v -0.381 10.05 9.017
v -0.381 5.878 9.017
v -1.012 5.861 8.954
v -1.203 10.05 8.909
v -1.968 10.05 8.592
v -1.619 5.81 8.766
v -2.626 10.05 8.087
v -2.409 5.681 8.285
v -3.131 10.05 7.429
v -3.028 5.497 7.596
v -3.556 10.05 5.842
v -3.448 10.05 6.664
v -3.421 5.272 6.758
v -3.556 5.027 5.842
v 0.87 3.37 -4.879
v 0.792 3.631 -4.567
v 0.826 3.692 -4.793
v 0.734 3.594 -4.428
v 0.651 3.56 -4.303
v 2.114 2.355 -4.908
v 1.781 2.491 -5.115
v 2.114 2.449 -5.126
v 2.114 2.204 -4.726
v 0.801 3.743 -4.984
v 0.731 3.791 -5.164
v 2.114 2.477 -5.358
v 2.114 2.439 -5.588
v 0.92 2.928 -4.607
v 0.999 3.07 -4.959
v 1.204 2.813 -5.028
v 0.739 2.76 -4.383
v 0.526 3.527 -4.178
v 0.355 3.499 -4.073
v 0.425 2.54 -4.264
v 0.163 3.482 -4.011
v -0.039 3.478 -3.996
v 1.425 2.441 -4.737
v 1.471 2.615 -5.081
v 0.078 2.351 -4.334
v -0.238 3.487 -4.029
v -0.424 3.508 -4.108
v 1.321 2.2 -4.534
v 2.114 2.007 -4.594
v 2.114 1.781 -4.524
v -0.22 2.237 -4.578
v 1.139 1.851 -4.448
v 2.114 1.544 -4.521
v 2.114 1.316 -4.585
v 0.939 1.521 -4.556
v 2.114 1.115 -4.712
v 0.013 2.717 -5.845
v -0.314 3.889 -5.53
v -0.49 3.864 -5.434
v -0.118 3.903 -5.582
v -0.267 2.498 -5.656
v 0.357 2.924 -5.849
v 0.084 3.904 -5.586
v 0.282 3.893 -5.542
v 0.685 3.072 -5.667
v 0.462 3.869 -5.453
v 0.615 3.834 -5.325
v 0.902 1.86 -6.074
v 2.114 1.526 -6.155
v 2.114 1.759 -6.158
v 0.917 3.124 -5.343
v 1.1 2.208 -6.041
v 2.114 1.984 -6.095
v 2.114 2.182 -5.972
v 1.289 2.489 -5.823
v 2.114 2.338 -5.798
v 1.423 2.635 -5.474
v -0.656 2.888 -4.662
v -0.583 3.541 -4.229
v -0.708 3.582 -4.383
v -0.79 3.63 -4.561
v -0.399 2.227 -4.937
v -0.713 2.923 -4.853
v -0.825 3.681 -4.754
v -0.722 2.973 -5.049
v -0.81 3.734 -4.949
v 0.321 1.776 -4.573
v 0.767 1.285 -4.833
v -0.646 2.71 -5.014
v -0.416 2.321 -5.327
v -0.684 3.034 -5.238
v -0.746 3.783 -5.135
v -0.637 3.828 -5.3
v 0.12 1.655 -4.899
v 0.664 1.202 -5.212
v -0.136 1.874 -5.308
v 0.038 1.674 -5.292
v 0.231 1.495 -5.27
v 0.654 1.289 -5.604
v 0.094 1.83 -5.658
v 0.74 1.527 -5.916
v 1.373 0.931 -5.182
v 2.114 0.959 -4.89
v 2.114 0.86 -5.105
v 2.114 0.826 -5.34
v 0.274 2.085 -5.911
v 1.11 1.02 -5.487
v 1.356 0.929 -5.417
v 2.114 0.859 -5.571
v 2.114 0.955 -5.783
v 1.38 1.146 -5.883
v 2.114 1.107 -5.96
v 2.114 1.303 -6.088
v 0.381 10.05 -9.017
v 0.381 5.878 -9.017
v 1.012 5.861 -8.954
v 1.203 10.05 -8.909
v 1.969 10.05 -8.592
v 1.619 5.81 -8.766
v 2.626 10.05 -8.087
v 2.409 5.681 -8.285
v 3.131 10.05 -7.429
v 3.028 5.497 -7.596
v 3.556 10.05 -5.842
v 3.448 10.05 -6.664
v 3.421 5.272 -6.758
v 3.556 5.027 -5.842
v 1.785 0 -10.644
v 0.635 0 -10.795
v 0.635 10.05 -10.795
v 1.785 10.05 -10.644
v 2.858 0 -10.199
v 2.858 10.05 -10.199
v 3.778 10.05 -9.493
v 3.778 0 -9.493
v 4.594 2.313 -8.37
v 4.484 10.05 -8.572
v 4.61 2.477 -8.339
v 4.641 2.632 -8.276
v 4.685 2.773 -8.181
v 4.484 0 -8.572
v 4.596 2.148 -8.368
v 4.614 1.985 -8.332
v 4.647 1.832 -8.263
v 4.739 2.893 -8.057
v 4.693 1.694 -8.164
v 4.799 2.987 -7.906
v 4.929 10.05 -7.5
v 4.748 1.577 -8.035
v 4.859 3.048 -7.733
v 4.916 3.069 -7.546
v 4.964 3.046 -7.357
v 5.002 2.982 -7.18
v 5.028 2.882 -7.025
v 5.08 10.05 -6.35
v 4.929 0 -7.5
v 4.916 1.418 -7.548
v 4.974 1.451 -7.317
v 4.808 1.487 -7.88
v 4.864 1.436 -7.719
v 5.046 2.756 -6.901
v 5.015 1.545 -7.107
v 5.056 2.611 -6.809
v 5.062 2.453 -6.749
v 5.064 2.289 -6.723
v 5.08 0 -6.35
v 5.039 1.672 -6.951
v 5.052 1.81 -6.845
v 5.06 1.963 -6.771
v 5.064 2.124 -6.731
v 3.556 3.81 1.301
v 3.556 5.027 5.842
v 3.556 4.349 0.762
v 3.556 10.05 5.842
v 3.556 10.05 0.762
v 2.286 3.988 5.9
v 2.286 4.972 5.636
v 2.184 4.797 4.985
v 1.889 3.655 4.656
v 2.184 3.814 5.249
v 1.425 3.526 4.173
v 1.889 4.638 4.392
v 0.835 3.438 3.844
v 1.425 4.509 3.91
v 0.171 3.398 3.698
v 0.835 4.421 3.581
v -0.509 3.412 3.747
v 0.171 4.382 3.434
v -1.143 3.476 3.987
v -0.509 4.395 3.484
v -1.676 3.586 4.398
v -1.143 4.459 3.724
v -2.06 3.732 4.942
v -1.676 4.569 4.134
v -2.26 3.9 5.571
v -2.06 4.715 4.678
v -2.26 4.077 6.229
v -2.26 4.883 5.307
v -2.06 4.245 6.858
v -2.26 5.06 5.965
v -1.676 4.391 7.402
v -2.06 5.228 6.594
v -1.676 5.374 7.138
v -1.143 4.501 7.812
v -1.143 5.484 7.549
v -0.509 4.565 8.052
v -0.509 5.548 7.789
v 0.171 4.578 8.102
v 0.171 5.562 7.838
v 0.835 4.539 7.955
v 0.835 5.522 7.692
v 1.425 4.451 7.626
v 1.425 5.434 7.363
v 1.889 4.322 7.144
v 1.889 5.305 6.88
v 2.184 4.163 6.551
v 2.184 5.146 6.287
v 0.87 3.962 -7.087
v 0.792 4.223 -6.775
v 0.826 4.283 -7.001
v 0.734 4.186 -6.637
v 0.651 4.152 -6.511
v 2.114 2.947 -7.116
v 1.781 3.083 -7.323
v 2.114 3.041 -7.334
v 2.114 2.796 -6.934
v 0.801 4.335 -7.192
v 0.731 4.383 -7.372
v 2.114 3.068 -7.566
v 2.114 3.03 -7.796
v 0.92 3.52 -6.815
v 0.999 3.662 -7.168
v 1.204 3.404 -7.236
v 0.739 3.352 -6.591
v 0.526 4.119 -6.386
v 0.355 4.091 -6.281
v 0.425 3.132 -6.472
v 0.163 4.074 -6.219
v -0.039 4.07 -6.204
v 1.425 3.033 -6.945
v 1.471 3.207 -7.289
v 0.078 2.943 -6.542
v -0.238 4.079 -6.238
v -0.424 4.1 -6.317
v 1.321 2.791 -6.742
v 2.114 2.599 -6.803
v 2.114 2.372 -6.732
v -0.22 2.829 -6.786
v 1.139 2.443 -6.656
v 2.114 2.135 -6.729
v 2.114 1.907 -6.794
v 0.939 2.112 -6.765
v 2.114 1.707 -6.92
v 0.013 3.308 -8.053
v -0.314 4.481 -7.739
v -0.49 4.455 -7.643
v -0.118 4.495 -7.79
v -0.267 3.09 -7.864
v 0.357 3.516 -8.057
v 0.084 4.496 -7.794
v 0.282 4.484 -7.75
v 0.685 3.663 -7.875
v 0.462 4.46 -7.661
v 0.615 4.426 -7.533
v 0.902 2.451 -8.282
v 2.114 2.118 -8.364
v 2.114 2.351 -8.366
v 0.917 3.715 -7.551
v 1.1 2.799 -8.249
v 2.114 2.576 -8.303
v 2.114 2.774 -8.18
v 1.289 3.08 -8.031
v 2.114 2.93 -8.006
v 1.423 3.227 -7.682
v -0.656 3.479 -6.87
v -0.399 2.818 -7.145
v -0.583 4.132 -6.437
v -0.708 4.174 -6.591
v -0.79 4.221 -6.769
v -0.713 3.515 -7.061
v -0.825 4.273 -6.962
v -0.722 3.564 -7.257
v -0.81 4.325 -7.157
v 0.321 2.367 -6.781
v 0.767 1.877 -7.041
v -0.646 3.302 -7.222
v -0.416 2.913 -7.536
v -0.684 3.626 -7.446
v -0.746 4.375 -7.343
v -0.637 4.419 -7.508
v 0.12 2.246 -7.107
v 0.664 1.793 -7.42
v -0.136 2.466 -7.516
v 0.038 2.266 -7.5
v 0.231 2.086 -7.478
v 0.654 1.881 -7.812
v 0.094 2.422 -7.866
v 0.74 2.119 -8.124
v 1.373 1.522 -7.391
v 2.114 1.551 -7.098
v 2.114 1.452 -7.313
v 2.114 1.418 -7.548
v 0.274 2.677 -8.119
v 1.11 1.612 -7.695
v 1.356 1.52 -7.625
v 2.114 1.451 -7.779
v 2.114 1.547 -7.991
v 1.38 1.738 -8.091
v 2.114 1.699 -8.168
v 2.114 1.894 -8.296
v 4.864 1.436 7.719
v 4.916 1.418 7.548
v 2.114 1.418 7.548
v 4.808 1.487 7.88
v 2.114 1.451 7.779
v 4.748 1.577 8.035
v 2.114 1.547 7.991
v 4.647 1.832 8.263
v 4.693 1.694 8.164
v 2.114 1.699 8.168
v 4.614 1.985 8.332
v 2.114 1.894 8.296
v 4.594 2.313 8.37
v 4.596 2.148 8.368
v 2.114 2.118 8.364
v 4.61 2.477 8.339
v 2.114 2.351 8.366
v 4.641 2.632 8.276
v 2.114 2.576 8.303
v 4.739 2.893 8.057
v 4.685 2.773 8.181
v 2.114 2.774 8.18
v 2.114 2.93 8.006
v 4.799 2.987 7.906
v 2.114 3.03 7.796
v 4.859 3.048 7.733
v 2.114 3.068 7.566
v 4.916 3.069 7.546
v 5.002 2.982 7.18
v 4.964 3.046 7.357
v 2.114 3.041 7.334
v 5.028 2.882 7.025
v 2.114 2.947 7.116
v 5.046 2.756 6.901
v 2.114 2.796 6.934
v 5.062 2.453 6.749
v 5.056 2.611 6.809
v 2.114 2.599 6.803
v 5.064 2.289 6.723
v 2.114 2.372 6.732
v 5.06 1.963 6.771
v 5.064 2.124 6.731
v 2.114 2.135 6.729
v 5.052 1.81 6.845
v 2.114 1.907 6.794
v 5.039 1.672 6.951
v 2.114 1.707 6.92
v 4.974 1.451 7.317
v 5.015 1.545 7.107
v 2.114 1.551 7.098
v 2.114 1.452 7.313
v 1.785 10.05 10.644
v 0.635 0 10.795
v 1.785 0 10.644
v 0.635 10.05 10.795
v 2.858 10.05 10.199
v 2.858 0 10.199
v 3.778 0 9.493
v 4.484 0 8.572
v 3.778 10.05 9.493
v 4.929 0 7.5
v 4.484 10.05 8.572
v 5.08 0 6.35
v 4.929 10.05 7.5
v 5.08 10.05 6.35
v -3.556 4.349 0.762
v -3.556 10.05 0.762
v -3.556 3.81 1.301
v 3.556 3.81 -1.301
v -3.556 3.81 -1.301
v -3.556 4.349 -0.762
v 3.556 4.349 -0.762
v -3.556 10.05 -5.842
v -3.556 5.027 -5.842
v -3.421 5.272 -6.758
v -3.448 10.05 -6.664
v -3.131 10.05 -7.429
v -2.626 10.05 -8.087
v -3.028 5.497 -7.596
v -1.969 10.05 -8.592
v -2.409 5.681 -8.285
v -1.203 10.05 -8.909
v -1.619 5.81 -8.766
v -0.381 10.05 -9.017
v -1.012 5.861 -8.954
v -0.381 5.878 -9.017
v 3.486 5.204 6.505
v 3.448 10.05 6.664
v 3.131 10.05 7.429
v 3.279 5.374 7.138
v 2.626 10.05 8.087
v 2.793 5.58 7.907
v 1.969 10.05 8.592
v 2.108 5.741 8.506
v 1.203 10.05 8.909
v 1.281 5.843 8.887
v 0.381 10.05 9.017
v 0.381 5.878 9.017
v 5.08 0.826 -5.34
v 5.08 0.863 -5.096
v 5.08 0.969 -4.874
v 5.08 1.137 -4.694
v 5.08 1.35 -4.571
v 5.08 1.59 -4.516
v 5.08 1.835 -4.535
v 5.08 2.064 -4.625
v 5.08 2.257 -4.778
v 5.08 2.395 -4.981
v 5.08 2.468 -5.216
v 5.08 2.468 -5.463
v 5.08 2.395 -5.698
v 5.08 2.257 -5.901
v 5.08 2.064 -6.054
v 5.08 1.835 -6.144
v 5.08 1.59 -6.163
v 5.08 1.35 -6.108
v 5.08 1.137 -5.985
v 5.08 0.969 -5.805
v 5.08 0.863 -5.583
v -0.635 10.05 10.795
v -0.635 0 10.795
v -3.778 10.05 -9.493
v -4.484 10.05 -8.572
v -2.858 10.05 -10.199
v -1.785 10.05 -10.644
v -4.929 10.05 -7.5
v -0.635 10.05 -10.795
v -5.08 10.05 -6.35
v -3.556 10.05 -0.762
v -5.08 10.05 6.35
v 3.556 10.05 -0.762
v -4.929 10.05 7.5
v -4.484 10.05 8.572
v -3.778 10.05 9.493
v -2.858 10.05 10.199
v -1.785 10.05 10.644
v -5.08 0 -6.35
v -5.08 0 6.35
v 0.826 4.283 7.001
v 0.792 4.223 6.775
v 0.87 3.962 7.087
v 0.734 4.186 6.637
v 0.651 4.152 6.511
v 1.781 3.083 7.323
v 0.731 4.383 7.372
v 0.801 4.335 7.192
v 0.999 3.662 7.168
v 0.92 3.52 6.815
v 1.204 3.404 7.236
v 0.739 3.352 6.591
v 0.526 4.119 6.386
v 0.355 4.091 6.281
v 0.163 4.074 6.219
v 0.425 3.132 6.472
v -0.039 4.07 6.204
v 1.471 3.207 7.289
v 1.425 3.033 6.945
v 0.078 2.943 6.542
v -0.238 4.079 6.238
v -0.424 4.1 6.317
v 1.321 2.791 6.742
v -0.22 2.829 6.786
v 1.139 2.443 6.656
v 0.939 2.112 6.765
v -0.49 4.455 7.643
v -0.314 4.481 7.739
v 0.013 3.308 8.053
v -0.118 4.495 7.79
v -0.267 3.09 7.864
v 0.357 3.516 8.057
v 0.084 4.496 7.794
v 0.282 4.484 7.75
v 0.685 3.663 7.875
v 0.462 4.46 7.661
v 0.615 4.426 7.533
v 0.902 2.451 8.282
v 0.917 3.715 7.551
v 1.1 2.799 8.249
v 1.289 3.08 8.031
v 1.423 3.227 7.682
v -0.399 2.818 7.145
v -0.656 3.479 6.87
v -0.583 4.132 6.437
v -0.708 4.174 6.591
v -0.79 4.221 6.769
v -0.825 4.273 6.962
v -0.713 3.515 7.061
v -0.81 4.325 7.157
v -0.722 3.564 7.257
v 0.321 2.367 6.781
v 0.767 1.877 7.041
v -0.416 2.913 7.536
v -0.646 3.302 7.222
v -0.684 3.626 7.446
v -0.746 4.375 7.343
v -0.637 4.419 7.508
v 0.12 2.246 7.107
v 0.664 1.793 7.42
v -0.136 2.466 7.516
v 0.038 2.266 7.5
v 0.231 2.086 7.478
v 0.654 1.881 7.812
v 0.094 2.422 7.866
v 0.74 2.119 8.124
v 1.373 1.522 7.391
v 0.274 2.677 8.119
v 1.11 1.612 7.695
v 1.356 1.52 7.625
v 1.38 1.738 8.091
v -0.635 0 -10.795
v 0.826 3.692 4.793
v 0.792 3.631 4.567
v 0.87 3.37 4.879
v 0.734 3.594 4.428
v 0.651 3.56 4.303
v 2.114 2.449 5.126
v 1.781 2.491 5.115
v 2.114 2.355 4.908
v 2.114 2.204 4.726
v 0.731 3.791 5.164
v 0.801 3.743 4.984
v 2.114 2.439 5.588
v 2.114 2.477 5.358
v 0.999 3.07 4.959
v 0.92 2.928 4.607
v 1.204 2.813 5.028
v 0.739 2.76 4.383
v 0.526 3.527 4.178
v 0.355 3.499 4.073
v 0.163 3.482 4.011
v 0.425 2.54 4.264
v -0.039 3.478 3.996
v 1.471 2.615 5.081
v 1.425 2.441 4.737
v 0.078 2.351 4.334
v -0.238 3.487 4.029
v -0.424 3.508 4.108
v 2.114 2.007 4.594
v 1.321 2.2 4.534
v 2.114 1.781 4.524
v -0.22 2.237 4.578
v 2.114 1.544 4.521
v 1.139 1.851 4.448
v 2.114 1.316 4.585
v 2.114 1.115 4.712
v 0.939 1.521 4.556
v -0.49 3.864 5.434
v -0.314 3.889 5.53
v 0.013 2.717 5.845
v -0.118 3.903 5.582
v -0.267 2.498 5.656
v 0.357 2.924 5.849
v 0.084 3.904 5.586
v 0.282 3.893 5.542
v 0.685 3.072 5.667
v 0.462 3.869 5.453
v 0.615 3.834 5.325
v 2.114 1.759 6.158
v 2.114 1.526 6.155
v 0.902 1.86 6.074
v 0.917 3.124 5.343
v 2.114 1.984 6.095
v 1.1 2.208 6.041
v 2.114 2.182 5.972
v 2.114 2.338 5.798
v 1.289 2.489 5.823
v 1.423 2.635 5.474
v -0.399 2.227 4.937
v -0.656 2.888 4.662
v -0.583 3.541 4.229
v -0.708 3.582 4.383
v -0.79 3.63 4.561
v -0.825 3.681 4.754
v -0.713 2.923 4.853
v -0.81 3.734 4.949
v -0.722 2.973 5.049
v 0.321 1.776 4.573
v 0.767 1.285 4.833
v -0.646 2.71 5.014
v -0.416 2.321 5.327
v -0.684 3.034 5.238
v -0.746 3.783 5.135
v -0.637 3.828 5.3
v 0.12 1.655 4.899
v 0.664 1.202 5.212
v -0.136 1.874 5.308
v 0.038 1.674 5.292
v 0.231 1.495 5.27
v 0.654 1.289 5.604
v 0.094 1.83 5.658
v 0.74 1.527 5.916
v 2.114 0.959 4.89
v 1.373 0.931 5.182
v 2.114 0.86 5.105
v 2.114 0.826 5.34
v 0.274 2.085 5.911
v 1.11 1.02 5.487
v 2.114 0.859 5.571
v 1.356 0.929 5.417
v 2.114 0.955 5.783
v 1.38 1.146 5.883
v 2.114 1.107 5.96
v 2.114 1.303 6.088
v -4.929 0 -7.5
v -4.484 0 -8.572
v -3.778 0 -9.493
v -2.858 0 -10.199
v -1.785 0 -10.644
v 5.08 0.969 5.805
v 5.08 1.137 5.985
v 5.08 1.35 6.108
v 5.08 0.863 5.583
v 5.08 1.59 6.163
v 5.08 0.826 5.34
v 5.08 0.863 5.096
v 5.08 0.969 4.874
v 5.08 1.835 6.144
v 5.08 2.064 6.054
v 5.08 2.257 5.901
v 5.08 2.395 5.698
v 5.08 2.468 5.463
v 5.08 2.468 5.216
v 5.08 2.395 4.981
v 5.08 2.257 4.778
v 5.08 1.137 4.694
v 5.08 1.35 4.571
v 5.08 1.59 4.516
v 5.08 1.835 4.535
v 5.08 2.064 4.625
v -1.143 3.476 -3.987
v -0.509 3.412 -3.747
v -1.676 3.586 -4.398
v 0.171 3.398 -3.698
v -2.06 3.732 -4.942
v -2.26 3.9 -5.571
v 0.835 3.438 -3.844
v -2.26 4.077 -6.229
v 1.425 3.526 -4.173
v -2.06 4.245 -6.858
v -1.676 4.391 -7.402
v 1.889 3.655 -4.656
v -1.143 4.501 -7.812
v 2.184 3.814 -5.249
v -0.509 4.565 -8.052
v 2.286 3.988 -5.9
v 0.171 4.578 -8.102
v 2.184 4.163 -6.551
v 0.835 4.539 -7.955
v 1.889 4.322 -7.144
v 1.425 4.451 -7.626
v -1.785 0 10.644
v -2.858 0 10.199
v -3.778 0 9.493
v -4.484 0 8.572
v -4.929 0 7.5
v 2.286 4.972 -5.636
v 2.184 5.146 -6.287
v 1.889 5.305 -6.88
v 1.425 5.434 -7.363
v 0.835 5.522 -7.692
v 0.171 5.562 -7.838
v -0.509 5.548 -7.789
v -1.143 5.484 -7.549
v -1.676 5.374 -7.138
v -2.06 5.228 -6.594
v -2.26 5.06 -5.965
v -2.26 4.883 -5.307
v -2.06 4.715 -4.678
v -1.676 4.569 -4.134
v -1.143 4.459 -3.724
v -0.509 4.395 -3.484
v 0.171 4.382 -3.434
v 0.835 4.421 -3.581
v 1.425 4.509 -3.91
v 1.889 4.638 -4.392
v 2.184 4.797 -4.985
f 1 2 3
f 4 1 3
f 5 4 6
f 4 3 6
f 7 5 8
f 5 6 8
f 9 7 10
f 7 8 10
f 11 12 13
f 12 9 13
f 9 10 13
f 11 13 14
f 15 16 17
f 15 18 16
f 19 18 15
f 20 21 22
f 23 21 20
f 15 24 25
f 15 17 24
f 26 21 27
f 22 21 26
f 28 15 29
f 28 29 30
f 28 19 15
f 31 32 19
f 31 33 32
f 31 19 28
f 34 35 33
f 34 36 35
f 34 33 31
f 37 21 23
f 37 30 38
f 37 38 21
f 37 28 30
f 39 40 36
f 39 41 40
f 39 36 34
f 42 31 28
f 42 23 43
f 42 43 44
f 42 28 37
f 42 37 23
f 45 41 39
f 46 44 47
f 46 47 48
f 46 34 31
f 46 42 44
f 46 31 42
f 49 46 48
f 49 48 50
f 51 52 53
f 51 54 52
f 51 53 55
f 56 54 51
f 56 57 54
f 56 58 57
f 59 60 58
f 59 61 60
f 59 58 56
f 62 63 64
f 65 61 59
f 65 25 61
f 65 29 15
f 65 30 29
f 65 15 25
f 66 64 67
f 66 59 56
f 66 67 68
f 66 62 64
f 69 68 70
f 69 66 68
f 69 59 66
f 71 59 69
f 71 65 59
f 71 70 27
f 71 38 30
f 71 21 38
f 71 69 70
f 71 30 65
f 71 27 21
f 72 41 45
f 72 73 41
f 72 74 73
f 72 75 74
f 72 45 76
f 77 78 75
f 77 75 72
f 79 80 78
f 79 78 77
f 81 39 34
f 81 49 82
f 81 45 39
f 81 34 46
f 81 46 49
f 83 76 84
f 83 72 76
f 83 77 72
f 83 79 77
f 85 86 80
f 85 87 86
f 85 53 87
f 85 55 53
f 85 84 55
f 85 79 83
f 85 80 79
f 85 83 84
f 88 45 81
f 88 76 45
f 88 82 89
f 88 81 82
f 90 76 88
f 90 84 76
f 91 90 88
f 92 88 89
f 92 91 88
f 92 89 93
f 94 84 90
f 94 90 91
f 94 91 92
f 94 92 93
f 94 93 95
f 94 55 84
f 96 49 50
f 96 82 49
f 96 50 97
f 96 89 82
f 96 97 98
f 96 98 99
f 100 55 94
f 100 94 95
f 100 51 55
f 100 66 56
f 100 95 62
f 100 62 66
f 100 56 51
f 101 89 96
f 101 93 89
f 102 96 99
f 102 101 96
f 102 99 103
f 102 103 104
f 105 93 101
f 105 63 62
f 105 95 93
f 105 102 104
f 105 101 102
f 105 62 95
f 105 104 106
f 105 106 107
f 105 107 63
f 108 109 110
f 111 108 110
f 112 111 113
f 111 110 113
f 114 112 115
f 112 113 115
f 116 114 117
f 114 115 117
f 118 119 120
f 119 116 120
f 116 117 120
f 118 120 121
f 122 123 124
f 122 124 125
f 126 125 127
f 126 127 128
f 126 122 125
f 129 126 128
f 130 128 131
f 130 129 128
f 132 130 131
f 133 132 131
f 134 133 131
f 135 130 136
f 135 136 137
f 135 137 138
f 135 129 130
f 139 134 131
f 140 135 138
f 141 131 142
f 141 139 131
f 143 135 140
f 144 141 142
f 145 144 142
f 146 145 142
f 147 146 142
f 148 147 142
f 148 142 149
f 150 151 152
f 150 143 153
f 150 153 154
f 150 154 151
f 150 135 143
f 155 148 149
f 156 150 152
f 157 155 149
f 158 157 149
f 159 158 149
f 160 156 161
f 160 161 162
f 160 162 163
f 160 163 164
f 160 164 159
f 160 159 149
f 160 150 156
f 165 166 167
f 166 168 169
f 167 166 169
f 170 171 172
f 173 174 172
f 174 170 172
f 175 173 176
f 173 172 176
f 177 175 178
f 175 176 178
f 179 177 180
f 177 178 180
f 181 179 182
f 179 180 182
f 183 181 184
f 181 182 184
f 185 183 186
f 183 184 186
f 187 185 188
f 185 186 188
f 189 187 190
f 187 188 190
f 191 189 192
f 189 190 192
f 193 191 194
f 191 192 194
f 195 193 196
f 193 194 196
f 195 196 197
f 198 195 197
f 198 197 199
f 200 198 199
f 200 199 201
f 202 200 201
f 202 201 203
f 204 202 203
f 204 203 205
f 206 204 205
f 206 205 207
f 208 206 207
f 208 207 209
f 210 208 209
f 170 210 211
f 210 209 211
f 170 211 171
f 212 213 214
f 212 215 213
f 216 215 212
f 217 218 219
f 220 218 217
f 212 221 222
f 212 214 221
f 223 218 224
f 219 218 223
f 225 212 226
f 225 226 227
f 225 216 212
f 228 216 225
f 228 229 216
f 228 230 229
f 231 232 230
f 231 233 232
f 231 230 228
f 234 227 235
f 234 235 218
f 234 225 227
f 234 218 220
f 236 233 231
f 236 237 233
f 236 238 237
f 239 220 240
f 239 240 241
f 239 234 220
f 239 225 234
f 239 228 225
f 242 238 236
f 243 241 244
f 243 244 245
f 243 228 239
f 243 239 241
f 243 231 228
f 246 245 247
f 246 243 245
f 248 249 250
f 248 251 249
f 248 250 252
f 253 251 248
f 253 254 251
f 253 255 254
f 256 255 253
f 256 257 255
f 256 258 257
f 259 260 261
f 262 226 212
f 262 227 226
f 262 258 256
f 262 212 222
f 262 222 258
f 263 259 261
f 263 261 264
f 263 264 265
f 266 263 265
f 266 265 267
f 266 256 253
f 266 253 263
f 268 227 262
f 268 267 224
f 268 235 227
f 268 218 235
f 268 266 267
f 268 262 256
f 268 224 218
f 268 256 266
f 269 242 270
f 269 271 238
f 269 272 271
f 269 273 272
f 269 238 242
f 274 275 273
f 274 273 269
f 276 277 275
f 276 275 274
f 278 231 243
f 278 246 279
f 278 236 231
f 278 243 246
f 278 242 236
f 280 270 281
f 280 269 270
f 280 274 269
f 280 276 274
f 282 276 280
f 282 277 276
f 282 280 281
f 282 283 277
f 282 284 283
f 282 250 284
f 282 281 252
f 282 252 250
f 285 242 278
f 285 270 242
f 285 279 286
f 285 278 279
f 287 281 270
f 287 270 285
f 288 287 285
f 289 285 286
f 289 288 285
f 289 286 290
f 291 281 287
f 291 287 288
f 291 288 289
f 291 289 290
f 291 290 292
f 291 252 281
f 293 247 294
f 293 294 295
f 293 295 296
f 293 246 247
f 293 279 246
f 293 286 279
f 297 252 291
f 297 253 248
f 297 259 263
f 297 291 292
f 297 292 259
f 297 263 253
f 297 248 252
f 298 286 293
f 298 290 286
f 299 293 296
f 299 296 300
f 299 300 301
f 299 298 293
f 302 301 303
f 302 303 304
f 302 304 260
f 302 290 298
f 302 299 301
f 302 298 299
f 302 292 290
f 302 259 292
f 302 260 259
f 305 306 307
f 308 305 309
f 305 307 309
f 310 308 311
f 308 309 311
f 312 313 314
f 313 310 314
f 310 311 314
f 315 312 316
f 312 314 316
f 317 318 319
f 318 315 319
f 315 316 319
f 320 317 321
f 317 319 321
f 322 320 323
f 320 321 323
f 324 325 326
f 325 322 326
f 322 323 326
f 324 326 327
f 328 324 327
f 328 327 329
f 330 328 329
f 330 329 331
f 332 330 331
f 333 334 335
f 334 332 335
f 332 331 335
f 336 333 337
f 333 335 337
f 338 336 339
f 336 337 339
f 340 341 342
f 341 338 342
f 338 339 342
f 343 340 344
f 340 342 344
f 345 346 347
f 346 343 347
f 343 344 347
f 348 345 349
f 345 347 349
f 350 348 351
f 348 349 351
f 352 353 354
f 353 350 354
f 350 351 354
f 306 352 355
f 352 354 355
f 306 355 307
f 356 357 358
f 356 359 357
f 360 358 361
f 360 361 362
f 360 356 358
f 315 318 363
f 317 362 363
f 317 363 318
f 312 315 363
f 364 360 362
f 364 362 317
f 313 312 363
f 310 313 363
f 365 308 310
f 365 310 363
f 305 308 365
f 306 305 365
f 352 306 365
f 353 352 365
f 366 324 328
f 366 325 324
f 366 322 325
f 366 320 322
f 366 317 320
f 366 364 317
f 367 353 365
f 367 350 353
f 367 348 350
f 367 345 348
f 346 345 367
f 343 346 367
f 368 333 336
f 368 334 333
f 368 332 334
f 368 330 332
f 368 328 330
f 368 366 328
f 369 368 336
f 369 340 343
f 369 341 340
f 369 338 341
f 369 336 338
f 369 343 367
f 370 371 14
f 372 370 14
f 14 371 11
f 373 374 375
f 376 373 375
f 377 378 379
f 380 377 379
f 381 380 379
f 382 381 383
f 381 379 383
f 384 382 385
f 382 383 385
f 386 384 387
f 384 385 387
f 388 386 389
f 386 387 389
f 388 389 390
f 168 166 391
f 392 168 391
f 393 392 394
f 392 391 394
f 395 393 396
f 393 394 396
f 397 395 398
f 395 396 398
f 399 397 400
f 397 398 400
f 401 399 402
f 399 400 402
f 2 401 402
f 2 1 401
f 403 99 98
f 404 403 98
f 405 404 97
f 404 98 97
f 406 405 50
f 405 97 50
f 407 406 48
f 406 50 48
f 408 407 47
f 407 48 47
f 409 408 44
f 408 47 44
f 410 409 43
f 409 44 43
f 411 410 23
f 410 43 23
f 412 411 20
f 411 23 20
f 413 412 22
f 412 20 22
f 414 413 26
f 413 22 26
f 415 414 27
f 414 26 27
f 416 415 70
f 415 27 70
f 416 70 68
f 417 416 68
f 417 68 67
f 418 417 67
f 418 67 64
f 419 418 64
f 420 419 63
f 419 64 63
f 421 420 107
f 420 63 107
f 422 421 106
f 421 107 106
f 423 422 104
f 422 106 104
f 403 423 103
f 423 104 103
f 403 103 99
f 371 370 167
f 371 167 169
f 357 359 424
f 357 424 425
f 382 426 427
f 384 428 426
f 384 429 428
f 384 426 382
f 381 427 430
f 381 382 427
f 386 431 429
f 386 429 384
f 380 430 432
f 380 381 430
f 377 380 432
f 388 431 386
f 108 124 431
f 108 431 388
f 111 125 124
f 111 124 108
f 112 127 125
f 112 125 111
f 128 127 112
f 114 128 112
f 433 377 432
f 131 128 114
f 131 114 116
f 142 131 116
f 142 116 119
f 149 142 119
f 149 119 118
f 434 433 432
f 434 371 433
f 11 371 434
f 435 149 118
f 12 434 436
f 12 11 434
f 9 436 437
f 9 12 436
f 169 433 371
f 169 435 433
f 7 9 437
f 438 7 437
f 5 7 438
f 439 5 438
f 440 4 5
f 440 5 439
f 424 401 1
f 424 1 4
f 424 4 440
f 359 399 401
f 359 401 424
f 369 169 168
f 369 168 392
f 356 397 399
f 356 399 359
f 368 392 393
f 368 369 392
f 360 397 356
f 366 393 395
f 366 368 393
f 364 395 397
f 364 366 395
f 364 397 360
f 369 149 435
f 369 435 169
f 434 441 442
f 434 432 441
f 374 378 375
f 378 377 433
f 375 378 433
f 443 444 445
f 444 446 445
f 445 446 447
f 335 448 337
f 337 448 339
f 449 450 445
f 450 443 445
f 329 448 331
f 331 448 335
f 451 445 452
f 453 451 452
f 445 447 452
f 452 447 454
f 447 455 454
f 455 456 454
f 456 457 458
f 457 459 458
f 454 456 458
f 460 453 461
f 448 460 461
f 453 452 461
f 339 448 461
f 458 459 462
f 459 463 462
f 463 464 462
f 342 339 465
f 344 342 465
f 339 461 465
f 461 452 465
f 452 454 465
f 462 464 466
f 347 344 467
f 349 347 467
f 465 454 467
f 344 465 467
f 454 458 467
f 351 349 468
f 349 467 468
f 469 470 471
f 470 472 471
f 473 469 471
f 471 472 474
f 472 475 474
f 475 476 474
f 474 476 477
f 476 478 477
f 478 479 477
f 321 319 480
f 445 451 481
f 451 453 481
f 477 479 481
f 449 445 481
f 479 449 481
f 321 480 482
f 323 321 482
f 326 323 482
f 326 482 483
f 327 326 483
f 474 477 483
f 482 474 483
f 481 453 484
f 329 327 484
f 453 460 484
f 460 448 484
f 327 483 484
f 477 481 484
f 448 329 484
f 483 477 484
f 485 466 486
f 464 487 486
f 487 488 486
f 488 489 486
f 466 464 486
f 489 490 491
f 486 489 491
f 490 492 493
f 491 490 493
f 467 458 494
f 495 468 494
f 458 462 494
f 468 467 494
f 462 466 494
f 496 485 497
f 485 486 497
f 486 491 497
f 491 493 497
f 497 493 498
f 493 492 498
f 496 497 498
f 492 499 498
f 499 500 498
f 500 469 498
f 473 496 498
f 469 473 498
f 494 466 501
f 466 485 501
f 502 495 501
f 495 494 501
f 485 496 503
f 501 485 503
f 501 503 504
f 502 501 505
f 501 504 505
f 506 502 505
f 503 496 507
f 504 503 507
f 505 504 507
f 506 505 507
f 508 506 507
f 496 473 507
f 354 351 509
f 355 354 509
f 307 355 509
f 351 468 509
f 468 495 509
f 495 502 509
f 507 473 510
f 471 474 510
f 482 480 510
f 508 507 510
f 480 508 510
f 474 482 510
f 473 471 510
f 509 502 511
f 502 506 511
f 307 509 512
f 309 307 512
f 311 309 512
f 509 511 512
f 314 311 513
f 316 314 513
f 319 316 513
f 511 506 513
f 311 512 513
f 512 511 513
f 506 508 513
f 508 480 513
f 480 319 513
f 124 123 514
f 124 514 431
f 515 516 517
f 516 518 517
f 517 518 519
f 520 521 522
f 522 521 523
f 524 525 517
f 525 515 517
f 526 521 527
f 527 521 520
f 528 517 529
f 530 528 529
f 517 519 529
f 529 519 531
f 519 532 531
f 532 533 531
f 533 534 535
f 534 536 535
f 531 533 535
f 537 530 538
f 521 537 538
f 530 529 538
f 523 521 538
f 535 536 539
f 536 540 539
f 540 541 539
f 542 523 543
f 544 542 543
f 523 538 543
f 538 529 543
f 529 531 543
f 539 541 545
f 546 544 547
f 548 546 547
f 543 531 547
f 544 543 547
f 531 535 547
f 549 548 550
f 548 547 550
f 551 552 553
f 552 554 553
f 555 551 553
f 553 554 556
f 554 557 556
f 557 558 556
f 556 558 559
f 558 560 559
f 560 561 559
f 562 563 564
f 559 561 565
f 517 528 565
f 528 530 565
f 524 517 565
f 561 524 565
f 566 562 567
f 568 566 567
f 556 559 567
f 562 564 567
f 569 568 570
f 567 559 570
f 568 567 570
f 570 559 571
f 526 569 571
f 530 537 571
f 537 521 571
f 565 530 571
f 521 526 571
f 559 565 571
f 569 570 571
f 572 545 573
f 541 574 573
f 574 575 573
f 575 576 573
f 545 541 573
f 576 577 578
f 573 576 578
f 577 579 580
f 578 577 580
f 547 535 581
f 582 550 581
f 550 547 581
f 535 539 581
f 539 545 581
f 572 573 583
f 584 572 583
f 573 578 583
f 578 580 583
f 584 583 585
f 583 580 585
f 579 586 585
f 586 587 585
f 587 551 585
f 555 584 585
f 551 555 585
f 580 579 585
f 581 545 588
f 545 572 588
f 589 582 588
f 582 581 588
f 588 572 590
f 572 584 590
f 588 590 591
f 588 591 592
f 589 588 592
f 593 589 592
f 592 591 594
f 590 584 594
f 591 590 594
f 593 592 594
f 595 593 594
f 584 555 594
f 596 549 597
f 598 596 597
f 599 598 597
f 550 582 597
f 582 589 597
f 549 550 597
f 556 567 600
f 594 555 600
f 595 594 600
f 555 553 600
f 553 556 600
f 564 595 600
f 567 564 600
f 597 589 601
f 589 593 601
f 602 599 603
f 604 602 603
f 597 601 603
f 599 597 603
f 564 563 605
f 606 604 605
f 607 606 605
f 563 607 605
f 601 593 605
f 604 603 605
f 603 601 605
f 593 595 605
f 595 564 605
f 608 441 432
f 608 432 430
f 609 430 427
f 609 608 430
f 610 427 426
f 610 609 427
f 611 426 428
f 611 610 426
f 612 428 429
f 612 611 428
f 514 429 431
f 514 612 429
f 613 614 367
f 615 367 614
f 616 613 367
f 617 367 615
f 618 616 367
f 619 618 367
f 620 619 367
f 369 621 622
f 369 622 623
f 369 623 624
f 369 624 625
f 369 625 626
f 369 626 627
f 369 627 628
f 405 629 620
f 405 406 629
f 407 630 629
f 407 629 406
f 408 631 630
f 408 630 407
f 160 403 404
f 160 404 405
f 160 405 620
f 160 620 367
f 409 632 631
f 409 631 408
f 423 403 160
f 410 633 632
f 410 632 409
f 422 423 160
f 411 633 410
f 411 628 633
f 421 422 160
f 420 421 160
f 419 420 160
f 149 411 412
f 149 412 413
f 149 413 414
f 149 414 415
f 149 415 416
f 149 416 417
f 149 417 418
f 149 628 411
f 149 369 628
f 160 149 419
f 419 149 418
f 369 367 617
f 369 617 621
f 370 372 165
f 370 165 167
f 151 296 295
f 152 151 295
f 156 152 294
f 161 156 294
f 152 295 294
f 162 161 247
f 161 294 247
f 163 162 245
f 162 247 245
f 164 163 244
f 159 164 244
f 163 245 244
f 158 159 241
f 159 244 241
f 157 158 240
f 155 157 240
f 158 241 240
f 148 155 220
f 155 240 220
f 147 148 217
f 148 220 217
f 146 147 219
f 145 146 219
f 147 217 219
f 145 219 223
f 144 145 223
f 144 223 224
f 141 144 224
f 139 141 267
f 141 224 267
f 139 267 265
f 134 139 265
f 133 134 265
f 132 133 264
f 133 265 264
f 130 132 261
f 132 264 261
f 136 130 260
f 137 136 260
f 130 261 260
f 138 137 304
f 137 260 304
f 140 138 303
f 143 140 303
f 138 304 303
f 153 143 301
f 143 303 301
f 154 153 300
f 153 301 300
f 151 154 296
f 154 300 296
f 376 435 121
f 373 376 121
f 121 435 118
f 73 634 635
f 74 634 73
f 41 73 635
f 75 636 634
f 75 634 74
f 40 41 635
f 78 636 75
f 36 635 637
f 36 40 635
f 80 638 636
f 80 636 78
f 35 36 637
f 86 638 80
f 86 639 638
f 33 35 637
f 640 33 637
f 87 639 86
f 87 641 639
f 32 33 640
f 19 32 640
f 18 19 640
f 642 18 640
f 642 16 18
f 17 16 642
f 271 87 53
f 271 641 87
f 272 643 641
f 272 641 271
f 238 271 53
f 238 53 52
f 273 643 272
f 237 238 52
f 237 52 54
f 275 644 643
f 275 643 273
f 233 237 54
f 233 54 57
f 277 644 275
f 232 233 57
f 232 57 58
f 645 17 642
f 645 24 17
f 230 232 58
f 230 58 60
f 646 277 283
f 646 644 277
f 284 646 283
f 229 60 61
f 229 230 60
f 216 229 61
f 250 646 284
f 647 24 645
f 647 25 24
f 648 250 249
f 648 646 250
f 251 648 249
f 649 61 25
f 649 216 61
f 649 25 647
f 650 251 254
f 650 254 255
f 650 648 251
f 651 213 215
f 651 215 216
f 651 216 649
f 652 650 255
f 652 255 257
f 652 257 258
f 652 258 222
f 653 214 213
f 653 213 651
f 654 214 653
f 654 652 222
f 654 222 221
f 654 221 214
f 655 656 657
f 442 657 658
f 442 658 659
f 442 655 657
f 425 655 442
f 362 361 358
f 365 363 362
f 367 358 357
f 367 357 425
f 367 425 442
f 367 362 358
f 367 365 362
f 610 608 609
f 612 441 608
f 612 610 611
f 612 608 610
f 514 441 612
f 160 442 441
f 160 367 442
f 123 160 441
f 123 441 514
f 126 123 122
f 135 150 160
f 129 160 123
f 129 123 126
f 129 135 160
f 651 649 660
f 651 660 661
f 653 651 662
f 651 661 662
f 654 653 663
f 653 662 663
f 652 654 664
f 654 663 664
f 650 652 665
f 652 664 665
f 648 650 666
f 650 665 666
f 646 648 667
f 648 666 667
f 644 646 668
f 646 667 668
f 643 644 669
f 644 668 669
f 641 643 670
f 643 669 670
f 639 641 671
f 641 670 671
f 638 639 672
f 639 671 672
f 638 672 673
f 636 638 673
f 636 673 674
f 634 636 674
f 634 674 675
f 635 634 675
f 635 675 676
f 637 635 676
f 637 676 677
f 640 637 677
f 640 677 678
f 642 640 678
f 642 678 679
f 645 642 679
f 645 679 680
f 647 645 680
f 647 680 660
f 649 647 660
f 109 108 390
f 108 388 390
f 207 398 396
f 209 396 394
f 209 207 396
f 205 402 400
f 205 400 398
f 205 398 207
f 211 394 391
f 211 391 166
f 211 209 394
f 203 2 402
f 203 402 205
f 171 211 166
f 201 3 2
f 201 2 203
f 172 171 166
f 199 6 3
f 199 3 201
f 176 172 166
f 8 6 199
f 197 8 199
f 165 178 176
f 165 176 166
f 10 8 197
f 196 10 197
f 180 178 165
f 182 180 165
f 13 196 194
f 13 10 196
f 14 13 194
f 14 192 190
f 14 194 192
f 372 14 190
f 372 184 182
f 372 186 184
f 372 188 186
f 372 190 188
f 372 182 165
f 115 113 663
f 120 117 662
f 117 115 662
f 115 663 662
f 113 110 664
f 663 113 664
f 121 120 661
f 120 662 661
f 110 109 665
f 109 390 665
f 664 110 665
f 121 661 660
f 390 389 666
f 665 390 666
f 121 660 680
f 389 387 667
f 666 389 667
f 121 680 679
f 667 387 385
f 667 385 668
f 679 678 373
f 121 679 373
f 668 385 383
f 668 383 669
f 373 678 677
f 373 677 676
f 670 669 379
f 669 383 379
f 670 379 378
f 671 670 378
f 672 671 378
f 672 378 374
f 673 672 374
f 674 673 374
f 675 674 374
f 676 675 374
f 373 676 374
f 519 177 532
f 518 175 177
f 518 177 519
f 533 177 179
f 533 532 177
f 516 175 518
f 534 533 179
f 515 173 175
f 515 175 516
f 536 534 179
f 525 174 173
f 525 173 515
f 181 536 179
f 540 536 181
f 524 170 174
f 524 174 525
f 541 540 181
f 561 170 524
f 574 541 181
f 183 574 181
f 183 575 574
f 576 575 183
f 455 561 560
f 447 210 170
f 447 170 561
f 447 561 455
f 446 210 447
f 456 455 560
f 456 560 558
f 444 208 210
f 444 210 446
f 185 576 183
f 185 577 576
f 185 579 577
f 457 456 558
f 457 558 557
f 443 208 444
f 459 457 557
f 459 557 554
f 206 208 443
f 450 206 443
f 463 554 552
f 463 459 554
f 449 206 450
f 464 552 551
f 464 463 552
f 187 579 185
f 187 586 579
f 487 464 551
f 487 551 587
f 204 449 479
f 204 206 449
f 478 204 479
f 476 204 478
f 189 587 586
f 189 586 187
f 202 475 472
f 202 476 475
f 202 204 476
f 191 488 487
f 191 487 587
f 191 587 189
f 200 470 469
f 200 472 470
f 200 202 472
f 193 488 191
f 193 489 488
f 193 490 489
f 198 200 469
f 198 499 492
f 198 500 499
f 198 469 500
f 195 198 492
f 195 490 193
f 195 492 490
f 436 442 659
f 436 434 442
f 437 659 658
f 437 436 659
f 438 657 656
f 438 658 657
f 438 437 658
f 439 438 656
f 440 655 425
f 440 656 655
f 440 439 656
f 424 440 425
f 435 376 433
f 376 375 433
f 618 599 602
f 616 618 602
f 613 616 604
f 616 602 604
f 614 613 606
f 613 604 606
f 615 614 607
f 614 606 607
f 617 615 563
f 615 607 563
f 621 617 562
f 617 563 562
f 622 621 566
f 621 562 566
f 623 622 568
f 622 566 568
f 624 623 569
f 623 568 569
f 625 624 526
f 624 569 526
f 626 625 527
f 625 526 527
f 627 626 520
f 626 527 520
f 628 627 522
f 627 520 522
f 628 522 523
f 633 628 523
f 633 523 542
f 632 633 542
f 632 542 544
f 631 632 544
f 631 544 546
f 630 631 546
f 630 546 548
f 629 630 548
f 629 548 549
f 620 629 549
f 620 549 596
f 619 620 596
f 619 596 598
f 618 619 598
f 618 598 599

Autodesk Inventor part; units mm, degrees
ref_plane "YZ Plane" through (0, 0, 0) normal (1, 0, 0) x (0, 1, 0)
ref_plane "XZ Plane" through (0, 0, 0) normal (0, 1, 0) x (-1, 0, 0)
sketch "Sketch1" plane through (0, 0, 0) normal (1, 0, 0) x (0, 1, 0)
  line L0 (0, 0) -> (0, 10.795)
  line L1 (0, 10.795) -> (10.05, 10.795)
  line L2 (10.05, 10.795) -> (10.05, 9.017)
  line L3 (10.05, 9.017) -> (5.8775, 9.017)
  line L4 (5.8775, 9.017) -> (3.81, 1.3008)
  line L5 (4.3488, 0.762) -> (10.05, 0.762)
  line L6 (10.05, 0.762) -> (10.05, 0)
  line L7 (0, 0) -> (10.05, 0) construction
  line L8 (3.81, 1.3008) -> (4.3488, 0.762)
  line L9 (0, 0) -> (0, -10.795)
  line L10 (0, -10.795) -> (10.05, -10.795)
  line L11 (10.05, -10.795) -> (10.05, -9.017)
  line L12 (10.05, -9.017) -> (5.8775, -9.017)
  line L13 (5.8775, -9.017) -> (3.81, -1.3008)
  line L14 (4.3488, -0.762) -> (10.05, -0.762)
  line L15 (10.05, -0.762) -> (10.05, 0)
  line L16 (3.81, -1.3008) -> (4.3488, -0.762)
  dimension "d0" = 10.795
  dimension "d1" = 105
  dimension "d8" = 0.762
  dimension "d33" = 3.81
  dimension "d34" = 10.05
  dimension "d35" = 0.762
  dimension "d36" = 1.778
extrude "Extrusion1" add sketch "Sketch1" along normal mid plane 7.112
sketch "Sketch2" plane through (3.556, 0, 0) normal (1, 0, 0) x (0, 0, -1)
  line L0 (-10.795, 10.05) -> (10.795, 10.05)
  line L1 (10.795, 10.05) -> (10.795, 0)
  line L2 (10.795, 0) -> (-10.795, 0)
  line L3 (-10.795, 0) -> (-10.795, 10.05)
  point P0 (0, 0)
extrude "Extrusion2" add sketch "Sketch2" along normal blind 1.524
ref_plane "Work Plane1" through (0, 0, 0) normal (-1, 0, 0) x (0, 0, 1)
mirror "Mirror1" about plane through (0, 0, 0) normal (-1, 0, 0) of "Extrusion2"
ref_plane "Work Plane2" through (3.556, 5.8775, 0) normal (0, 0, 1) x (1, 0, 0)
sketch "Sketch3" plane through (-3.556, 3.81, -1.3008) normal (0, 0.9659258, 0.258819) x (1, 0, 0)
  circle A0 centre (3.556, 4.4884) radius 2.286
  line L0 (3.556, -2.2426) -> (3.556, 4.4884) construction
  line L1 (7.112, 1.0946) -> (0, 1.0946) construction
  dimension "d14" = 4.572
  dimension "d15" = 6.731
extrude "Extrusion3" cut sketch "Sketch3" against normal blind 1.016
mirror "Mirror2" about plane through (3.556, 5.8775, 0) normal (0, 0, 1) of "Extrusion3"
fillet "Fillet4" radius 3.175 4 edges at (3.556, 7.9638, -9.017) (-3.556, 7.9638, -9.017) (3.556, 7.9638, 9.017) (-3.556, 7.9638, 9.017)
fillet "Fillet5" radius 4.445 4 edges at (5.08, 5.025, 10.795) (5.08, 5.025, -10.795) (-5.08, 5.025, -10.795) (-5.08, 5.025, 10.795)
sketch "Sketch4" plane through (0, 3.9903, 5.8992) normal (0, 0.9659258, -0.258819) x (1, 0, 0)
  line L0 (0, 0.0029) -> (0, -1.1401) construction
  line L1 (0, 0.0029) -> (0, 1.1459) construction
  line L2 (0, 0.0029) -> (0, -1.1079) construction
  circle A0 centre (0, 1.1459) radius 0.8255
  circle A1 centre (0, -1.1401) radius 0.8255
  line L3 (2.1143, 0.0029) -> (2.1143, 2.2658) construction
  point P0 (0, 6.731)
  dimension "d43" = 1.143
  dimension "d44" = 1.651
revolve "Revolution1" cut sketch "Sketch4" angle 90 about axis through (2.1143, 3.9896, 5.8964) along (0, 0.258819, 0.9659258)
mirror "Mirror3" about plane through (3.556, 5.8775, 0) normal (0, 0, 1) of "Revolution1"
sketch "Sketch6" plane through (2.1143, 4.7773, -7.6581) normal (-1, 0, 0) x (0, -1, 0)
  circle A0 centre (2.5341, 0.1105) radius 0.8255 projected
  circle A1 centre (2.5341, 0.1105) radius 0.8255
  circle A2 centre (3.1258, 2.3186) radius 0.8255 projected
  circle A3 centre (3.1258, 2.3186) radius 0.8255
  point P0 (4.7773, 7.6581)
extrude "Extrusion6" cut sketch "Sketch6" against normal up to next
mirror "Mirror10" about plane through (3.556, 5.8775, 0) normal (0, 0, 1) of "Extrusion6"
equation "\"d0\" = 0.5 * Base_Length"
equation "\"d1\" = Sensor_Angle"
equation "\"d33\" = Base_Thickness"
equation "\"d34\" = Mount_Height"
equation "\"d14\" = LED_Base"
equation "\"d15\" = Hole_to_Center"
equation "\"d18\" = Wire_Spacing"
equation "\"Wire_Spacing\" = 1.143"
equation "\"Wire_Diameter\" = 1.651"
equation "\"LED_Base\" = 4.572"
equation "\"Mount_Space\" = 22.75"
equation "\"Mount_Clearance\" = 6.35"
equation "\"Mount_Height\" = 10.05"
equation "\"Base_Length\" = 21.59"
equation "\"Base_Width\" = 10.16"
equation "\"Sensor_Angle\" = 105deg"
equation "\"Base_Thickness\" = 3.81"
equation "\"Hole_to_Center\" = 6.731"
equation "\"Tape_Width\" = 6.35"
properties part number "Line Tracker v4" material "PLA Plastic"
